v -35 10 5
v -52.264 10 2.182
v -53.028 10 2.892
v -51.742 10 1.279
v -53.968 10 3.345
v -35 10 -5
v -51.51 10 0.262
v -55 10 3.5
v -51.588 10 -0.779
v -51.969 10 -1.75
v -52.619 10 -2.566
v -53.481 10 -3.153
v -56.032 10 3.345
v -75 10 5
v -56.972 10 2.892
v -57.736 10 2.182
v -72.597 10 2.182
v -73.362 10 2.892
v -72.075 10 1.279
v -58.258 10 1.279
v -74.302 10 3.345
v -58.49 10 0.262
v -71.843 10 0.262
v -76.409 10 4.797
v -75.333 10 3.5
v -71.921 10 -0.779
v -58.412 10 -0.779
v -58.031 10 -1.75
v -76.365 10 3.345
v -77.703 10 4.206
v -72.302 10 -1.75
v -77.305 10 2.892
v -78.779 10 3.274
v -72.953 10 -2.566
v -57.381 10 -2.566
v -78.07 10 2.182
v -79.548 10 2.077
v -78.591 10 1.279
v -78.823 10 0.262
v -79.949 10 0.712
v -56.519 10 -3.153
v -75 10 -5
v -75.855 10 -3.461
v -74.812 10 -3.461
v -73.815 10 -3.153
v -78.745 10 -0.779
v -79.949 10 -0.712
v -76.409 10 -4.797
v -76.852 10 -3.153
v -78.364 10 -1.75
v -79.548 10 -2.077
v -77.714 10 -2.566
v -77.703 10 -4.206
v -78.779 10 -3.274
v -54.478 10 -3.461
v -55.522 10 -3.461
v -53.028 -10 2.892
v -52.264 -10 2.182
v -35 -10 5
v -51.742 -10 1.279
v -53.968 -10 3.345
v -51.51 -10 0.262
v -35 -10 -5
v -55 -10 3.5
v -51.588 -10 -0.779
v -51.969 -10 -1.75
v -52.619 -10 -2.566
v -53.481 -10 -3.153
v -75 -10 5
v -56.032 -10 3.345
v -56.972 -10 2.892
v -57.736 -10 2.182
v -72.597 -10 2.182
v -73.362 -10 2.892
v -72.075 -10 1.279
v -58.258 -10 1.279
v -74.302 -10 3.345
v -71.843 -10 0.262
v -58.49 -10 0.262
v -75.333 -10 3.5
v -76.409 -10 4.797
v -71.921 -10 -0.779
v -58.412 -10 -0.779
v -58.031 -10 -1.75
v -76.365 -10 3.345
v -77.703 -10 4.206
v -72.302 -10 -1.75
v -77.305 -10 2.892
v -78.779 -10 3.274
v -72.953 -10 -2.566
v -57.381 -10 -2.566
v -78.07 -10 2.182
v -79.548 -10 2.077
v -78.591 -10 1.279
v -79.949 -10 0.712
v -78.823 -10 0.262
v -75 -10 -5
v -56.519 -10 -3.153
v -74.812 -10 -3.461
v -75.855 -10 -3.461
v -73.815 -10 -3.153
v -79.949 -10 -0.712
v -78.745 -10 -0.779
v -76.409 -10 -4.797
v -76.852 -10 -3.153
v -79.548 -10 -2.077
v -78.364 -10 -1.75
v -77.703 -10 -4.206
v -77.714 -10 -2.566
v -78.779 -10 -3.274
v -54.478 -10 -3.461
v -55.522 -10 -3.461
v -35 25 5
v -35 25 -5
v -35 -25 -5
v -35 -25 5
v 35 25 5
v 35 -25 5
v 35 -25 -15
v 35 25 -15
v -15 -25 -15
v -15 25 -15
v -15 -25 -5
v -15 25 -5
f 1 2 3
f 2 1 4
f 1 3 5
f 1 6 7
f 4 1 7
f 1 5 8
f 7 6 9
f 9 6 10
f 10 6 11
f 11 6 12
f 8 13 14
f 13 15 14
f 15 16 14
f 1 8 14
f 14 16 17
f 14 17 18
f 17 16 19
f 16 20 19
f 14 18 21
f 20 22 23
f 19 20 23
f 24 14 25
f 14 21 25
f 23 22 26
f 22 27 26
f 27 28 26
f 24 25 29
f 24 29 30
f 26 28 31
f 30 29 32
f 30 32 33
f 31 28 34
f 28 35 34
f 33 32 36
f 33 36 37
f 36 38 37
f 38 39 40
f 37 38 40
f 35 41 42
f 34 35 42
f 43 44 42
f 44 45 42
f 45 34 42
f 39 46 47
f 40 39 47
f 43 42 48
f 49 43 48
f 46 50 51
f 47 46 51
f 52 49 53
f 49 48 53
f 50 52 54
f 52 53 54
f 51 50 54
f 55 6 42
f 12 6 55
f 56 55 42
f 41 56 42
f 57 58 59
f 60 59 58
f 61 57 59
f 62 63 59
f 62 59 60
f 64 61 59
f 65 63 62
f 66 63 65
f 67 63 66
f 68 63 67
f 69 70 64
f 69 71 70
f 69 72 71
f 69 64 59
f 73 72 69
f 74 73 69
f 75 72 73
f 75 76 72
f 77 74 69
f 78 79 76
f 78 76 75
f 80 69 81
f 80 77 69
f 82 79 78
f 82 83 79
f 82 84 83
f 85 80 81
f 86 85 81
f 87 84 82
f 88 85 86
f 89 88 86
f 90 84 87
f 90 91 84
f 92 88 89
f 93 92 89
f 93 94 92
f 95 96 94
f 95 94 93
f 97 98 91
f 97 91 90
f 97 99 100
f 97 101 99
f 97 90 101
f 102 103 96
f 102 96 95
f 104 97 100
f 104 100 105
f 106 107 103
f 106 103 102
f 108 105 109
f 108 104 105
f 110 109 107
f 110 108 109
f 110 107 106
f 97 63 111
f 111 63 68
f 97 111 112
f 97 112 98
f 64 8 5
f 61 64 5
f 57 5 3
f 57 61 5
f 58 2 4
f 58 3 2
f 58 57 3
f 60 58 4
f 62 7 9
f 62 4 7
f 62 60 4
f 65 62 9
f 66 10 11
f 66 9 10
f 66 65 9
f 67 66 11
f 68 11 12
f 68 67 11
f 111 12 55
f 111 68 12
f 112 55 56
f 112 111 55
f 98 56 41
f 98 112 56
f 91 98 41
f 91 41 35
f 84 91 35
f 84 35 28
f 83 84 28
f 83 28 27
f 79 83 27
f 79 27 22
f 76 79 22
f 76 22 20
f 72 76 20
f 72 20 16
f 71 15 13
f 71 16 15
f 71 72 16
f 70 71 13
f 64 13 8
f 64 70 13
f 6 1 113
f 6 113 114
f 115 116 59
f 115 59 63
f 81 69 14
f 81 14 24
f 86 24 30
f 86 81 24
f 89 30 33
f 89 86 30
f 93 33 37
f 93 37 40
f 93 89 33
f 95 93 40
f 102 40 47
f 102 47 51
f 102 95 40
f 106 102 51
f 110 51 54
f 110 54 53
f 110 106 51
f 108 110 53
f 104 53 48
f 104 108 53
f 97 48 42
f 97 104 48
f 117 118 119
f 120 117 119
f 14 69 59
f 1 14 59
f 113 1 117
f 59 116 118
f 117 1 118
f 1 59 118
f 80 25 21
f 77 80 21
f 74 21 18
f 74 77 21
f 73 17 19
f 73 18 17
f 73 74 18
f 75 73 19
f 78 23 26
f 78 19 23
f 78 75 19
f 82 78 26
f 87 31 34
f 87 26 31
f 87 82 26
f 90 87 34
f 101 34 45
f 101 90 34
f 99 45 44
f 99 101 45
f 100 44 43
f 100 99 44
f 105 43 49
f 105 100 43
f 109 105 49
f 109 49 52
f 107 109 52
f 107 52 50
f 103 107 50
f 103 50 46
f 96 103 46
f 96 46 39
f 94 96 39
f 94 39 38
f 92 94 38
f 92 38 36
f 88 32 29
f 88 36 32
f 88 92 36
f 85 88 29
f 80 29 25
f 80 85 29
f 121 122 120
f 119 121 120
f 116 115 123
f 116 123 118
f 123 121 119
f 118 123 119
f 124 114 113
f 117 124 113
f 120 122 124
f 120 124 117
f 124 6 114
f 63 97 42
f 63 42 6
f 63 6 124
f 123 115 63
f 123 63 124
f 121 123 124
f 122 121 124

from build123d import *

# Parameters (mm, degrees)
BOSS_EXTRUDE1_DEPTH      = 25
BOSS_EXTRUDE1_DEPTH_BACK = 25
SKETCH1_W                = 70
SKETCH1_H                = 10
BOSS_EXTRUDE2_DEPTH      = 10
BOSS_EXTRUDE2_DEPTH_BACK = 10
CUT_EXTRUDE1_DEPTH       = 19
CUT_EXTRUDE1_DEPTH_BACK  = 16
SKETCH3_R                = 3.5
SKETCH4_W                = 50
SKETCH4_H                = 50
BOSS_EXTRUDE3_DEPTH      = 15


with BuildPart() as part:
    # Sketch1 → Boss-Extrude1 (new, two sides: drawn at the far end of the back side and taken through both)
    with BuildSketch(Plane(origin=(0, 0, 0), x_dir=(1, 0, 0), z_dir=(0, 1, 0)).offset(-BOSS_EXTRUDE1_DEPTH_BACK)):
        Rectangle(SKETCH1_W, SKETCH1_H)
    extrude(amount=BOSS_EXTRUDE1_DEPTH + BOSS_EXTRUDE1_DEPTH_BACK)

    # Sketch2 → Boss-Extrude2 (add, two sides: drawn at the far end of the back side and taken through both)
    with BuildSketch(Plane(origin=(0, 0, 0), x_dir=(1, 0, 0), z_dir=(0, 1, 0)).offset(-BOSS_EXTRUDE2_DEPTH_BACK)):
        with BuildLine():
            Line((-75, 5), (-35, 5))
            Line((-35, 5), (-35, -5))
            Line((-35, -5), (-75, -5))
            ThreePointArc((-75, -5), (-80, 0), (-75, 5))
        make_face()
    extrude(amount=BOSS_EXTRUDE2_DEPTH + BOSS_EXTRUDE2_DEPTH_BACK)

    # Sketch3 → Cut-Extrude1 (cut, two sides: drawn at the far end of the back side and taken through both)
    with BuildSketch(Plane(origin=(0, 0, 0), x_dir=(1, 0, 0), z_dir=(0, 1, 0)).offset(-CUT_EXTRUDE1_DEPTH_BACK)):
        with Locations((-75.333177097, 0)):
            Circle(SKETCH3_R)
        with Locations((-55, 0)):
            Circle(SKETCH3_R)
    extrude(amount=CUT_EXTRUDE1_DEPTH + CUT_EXTRUDE1_DEPTH_BACK, mode=Mode.SUBTRACT)

    # Sketch4 → Boss-Extrude3 (add)
    with BuildSketch(Plane.XY):
        with Locations((10, 0)):
            Rectangle(SKETCH4_W, SKETCH4_H)
    extrude(amount=-BOSS_EXTRUDE3_DEPTH)


solid = part.part
